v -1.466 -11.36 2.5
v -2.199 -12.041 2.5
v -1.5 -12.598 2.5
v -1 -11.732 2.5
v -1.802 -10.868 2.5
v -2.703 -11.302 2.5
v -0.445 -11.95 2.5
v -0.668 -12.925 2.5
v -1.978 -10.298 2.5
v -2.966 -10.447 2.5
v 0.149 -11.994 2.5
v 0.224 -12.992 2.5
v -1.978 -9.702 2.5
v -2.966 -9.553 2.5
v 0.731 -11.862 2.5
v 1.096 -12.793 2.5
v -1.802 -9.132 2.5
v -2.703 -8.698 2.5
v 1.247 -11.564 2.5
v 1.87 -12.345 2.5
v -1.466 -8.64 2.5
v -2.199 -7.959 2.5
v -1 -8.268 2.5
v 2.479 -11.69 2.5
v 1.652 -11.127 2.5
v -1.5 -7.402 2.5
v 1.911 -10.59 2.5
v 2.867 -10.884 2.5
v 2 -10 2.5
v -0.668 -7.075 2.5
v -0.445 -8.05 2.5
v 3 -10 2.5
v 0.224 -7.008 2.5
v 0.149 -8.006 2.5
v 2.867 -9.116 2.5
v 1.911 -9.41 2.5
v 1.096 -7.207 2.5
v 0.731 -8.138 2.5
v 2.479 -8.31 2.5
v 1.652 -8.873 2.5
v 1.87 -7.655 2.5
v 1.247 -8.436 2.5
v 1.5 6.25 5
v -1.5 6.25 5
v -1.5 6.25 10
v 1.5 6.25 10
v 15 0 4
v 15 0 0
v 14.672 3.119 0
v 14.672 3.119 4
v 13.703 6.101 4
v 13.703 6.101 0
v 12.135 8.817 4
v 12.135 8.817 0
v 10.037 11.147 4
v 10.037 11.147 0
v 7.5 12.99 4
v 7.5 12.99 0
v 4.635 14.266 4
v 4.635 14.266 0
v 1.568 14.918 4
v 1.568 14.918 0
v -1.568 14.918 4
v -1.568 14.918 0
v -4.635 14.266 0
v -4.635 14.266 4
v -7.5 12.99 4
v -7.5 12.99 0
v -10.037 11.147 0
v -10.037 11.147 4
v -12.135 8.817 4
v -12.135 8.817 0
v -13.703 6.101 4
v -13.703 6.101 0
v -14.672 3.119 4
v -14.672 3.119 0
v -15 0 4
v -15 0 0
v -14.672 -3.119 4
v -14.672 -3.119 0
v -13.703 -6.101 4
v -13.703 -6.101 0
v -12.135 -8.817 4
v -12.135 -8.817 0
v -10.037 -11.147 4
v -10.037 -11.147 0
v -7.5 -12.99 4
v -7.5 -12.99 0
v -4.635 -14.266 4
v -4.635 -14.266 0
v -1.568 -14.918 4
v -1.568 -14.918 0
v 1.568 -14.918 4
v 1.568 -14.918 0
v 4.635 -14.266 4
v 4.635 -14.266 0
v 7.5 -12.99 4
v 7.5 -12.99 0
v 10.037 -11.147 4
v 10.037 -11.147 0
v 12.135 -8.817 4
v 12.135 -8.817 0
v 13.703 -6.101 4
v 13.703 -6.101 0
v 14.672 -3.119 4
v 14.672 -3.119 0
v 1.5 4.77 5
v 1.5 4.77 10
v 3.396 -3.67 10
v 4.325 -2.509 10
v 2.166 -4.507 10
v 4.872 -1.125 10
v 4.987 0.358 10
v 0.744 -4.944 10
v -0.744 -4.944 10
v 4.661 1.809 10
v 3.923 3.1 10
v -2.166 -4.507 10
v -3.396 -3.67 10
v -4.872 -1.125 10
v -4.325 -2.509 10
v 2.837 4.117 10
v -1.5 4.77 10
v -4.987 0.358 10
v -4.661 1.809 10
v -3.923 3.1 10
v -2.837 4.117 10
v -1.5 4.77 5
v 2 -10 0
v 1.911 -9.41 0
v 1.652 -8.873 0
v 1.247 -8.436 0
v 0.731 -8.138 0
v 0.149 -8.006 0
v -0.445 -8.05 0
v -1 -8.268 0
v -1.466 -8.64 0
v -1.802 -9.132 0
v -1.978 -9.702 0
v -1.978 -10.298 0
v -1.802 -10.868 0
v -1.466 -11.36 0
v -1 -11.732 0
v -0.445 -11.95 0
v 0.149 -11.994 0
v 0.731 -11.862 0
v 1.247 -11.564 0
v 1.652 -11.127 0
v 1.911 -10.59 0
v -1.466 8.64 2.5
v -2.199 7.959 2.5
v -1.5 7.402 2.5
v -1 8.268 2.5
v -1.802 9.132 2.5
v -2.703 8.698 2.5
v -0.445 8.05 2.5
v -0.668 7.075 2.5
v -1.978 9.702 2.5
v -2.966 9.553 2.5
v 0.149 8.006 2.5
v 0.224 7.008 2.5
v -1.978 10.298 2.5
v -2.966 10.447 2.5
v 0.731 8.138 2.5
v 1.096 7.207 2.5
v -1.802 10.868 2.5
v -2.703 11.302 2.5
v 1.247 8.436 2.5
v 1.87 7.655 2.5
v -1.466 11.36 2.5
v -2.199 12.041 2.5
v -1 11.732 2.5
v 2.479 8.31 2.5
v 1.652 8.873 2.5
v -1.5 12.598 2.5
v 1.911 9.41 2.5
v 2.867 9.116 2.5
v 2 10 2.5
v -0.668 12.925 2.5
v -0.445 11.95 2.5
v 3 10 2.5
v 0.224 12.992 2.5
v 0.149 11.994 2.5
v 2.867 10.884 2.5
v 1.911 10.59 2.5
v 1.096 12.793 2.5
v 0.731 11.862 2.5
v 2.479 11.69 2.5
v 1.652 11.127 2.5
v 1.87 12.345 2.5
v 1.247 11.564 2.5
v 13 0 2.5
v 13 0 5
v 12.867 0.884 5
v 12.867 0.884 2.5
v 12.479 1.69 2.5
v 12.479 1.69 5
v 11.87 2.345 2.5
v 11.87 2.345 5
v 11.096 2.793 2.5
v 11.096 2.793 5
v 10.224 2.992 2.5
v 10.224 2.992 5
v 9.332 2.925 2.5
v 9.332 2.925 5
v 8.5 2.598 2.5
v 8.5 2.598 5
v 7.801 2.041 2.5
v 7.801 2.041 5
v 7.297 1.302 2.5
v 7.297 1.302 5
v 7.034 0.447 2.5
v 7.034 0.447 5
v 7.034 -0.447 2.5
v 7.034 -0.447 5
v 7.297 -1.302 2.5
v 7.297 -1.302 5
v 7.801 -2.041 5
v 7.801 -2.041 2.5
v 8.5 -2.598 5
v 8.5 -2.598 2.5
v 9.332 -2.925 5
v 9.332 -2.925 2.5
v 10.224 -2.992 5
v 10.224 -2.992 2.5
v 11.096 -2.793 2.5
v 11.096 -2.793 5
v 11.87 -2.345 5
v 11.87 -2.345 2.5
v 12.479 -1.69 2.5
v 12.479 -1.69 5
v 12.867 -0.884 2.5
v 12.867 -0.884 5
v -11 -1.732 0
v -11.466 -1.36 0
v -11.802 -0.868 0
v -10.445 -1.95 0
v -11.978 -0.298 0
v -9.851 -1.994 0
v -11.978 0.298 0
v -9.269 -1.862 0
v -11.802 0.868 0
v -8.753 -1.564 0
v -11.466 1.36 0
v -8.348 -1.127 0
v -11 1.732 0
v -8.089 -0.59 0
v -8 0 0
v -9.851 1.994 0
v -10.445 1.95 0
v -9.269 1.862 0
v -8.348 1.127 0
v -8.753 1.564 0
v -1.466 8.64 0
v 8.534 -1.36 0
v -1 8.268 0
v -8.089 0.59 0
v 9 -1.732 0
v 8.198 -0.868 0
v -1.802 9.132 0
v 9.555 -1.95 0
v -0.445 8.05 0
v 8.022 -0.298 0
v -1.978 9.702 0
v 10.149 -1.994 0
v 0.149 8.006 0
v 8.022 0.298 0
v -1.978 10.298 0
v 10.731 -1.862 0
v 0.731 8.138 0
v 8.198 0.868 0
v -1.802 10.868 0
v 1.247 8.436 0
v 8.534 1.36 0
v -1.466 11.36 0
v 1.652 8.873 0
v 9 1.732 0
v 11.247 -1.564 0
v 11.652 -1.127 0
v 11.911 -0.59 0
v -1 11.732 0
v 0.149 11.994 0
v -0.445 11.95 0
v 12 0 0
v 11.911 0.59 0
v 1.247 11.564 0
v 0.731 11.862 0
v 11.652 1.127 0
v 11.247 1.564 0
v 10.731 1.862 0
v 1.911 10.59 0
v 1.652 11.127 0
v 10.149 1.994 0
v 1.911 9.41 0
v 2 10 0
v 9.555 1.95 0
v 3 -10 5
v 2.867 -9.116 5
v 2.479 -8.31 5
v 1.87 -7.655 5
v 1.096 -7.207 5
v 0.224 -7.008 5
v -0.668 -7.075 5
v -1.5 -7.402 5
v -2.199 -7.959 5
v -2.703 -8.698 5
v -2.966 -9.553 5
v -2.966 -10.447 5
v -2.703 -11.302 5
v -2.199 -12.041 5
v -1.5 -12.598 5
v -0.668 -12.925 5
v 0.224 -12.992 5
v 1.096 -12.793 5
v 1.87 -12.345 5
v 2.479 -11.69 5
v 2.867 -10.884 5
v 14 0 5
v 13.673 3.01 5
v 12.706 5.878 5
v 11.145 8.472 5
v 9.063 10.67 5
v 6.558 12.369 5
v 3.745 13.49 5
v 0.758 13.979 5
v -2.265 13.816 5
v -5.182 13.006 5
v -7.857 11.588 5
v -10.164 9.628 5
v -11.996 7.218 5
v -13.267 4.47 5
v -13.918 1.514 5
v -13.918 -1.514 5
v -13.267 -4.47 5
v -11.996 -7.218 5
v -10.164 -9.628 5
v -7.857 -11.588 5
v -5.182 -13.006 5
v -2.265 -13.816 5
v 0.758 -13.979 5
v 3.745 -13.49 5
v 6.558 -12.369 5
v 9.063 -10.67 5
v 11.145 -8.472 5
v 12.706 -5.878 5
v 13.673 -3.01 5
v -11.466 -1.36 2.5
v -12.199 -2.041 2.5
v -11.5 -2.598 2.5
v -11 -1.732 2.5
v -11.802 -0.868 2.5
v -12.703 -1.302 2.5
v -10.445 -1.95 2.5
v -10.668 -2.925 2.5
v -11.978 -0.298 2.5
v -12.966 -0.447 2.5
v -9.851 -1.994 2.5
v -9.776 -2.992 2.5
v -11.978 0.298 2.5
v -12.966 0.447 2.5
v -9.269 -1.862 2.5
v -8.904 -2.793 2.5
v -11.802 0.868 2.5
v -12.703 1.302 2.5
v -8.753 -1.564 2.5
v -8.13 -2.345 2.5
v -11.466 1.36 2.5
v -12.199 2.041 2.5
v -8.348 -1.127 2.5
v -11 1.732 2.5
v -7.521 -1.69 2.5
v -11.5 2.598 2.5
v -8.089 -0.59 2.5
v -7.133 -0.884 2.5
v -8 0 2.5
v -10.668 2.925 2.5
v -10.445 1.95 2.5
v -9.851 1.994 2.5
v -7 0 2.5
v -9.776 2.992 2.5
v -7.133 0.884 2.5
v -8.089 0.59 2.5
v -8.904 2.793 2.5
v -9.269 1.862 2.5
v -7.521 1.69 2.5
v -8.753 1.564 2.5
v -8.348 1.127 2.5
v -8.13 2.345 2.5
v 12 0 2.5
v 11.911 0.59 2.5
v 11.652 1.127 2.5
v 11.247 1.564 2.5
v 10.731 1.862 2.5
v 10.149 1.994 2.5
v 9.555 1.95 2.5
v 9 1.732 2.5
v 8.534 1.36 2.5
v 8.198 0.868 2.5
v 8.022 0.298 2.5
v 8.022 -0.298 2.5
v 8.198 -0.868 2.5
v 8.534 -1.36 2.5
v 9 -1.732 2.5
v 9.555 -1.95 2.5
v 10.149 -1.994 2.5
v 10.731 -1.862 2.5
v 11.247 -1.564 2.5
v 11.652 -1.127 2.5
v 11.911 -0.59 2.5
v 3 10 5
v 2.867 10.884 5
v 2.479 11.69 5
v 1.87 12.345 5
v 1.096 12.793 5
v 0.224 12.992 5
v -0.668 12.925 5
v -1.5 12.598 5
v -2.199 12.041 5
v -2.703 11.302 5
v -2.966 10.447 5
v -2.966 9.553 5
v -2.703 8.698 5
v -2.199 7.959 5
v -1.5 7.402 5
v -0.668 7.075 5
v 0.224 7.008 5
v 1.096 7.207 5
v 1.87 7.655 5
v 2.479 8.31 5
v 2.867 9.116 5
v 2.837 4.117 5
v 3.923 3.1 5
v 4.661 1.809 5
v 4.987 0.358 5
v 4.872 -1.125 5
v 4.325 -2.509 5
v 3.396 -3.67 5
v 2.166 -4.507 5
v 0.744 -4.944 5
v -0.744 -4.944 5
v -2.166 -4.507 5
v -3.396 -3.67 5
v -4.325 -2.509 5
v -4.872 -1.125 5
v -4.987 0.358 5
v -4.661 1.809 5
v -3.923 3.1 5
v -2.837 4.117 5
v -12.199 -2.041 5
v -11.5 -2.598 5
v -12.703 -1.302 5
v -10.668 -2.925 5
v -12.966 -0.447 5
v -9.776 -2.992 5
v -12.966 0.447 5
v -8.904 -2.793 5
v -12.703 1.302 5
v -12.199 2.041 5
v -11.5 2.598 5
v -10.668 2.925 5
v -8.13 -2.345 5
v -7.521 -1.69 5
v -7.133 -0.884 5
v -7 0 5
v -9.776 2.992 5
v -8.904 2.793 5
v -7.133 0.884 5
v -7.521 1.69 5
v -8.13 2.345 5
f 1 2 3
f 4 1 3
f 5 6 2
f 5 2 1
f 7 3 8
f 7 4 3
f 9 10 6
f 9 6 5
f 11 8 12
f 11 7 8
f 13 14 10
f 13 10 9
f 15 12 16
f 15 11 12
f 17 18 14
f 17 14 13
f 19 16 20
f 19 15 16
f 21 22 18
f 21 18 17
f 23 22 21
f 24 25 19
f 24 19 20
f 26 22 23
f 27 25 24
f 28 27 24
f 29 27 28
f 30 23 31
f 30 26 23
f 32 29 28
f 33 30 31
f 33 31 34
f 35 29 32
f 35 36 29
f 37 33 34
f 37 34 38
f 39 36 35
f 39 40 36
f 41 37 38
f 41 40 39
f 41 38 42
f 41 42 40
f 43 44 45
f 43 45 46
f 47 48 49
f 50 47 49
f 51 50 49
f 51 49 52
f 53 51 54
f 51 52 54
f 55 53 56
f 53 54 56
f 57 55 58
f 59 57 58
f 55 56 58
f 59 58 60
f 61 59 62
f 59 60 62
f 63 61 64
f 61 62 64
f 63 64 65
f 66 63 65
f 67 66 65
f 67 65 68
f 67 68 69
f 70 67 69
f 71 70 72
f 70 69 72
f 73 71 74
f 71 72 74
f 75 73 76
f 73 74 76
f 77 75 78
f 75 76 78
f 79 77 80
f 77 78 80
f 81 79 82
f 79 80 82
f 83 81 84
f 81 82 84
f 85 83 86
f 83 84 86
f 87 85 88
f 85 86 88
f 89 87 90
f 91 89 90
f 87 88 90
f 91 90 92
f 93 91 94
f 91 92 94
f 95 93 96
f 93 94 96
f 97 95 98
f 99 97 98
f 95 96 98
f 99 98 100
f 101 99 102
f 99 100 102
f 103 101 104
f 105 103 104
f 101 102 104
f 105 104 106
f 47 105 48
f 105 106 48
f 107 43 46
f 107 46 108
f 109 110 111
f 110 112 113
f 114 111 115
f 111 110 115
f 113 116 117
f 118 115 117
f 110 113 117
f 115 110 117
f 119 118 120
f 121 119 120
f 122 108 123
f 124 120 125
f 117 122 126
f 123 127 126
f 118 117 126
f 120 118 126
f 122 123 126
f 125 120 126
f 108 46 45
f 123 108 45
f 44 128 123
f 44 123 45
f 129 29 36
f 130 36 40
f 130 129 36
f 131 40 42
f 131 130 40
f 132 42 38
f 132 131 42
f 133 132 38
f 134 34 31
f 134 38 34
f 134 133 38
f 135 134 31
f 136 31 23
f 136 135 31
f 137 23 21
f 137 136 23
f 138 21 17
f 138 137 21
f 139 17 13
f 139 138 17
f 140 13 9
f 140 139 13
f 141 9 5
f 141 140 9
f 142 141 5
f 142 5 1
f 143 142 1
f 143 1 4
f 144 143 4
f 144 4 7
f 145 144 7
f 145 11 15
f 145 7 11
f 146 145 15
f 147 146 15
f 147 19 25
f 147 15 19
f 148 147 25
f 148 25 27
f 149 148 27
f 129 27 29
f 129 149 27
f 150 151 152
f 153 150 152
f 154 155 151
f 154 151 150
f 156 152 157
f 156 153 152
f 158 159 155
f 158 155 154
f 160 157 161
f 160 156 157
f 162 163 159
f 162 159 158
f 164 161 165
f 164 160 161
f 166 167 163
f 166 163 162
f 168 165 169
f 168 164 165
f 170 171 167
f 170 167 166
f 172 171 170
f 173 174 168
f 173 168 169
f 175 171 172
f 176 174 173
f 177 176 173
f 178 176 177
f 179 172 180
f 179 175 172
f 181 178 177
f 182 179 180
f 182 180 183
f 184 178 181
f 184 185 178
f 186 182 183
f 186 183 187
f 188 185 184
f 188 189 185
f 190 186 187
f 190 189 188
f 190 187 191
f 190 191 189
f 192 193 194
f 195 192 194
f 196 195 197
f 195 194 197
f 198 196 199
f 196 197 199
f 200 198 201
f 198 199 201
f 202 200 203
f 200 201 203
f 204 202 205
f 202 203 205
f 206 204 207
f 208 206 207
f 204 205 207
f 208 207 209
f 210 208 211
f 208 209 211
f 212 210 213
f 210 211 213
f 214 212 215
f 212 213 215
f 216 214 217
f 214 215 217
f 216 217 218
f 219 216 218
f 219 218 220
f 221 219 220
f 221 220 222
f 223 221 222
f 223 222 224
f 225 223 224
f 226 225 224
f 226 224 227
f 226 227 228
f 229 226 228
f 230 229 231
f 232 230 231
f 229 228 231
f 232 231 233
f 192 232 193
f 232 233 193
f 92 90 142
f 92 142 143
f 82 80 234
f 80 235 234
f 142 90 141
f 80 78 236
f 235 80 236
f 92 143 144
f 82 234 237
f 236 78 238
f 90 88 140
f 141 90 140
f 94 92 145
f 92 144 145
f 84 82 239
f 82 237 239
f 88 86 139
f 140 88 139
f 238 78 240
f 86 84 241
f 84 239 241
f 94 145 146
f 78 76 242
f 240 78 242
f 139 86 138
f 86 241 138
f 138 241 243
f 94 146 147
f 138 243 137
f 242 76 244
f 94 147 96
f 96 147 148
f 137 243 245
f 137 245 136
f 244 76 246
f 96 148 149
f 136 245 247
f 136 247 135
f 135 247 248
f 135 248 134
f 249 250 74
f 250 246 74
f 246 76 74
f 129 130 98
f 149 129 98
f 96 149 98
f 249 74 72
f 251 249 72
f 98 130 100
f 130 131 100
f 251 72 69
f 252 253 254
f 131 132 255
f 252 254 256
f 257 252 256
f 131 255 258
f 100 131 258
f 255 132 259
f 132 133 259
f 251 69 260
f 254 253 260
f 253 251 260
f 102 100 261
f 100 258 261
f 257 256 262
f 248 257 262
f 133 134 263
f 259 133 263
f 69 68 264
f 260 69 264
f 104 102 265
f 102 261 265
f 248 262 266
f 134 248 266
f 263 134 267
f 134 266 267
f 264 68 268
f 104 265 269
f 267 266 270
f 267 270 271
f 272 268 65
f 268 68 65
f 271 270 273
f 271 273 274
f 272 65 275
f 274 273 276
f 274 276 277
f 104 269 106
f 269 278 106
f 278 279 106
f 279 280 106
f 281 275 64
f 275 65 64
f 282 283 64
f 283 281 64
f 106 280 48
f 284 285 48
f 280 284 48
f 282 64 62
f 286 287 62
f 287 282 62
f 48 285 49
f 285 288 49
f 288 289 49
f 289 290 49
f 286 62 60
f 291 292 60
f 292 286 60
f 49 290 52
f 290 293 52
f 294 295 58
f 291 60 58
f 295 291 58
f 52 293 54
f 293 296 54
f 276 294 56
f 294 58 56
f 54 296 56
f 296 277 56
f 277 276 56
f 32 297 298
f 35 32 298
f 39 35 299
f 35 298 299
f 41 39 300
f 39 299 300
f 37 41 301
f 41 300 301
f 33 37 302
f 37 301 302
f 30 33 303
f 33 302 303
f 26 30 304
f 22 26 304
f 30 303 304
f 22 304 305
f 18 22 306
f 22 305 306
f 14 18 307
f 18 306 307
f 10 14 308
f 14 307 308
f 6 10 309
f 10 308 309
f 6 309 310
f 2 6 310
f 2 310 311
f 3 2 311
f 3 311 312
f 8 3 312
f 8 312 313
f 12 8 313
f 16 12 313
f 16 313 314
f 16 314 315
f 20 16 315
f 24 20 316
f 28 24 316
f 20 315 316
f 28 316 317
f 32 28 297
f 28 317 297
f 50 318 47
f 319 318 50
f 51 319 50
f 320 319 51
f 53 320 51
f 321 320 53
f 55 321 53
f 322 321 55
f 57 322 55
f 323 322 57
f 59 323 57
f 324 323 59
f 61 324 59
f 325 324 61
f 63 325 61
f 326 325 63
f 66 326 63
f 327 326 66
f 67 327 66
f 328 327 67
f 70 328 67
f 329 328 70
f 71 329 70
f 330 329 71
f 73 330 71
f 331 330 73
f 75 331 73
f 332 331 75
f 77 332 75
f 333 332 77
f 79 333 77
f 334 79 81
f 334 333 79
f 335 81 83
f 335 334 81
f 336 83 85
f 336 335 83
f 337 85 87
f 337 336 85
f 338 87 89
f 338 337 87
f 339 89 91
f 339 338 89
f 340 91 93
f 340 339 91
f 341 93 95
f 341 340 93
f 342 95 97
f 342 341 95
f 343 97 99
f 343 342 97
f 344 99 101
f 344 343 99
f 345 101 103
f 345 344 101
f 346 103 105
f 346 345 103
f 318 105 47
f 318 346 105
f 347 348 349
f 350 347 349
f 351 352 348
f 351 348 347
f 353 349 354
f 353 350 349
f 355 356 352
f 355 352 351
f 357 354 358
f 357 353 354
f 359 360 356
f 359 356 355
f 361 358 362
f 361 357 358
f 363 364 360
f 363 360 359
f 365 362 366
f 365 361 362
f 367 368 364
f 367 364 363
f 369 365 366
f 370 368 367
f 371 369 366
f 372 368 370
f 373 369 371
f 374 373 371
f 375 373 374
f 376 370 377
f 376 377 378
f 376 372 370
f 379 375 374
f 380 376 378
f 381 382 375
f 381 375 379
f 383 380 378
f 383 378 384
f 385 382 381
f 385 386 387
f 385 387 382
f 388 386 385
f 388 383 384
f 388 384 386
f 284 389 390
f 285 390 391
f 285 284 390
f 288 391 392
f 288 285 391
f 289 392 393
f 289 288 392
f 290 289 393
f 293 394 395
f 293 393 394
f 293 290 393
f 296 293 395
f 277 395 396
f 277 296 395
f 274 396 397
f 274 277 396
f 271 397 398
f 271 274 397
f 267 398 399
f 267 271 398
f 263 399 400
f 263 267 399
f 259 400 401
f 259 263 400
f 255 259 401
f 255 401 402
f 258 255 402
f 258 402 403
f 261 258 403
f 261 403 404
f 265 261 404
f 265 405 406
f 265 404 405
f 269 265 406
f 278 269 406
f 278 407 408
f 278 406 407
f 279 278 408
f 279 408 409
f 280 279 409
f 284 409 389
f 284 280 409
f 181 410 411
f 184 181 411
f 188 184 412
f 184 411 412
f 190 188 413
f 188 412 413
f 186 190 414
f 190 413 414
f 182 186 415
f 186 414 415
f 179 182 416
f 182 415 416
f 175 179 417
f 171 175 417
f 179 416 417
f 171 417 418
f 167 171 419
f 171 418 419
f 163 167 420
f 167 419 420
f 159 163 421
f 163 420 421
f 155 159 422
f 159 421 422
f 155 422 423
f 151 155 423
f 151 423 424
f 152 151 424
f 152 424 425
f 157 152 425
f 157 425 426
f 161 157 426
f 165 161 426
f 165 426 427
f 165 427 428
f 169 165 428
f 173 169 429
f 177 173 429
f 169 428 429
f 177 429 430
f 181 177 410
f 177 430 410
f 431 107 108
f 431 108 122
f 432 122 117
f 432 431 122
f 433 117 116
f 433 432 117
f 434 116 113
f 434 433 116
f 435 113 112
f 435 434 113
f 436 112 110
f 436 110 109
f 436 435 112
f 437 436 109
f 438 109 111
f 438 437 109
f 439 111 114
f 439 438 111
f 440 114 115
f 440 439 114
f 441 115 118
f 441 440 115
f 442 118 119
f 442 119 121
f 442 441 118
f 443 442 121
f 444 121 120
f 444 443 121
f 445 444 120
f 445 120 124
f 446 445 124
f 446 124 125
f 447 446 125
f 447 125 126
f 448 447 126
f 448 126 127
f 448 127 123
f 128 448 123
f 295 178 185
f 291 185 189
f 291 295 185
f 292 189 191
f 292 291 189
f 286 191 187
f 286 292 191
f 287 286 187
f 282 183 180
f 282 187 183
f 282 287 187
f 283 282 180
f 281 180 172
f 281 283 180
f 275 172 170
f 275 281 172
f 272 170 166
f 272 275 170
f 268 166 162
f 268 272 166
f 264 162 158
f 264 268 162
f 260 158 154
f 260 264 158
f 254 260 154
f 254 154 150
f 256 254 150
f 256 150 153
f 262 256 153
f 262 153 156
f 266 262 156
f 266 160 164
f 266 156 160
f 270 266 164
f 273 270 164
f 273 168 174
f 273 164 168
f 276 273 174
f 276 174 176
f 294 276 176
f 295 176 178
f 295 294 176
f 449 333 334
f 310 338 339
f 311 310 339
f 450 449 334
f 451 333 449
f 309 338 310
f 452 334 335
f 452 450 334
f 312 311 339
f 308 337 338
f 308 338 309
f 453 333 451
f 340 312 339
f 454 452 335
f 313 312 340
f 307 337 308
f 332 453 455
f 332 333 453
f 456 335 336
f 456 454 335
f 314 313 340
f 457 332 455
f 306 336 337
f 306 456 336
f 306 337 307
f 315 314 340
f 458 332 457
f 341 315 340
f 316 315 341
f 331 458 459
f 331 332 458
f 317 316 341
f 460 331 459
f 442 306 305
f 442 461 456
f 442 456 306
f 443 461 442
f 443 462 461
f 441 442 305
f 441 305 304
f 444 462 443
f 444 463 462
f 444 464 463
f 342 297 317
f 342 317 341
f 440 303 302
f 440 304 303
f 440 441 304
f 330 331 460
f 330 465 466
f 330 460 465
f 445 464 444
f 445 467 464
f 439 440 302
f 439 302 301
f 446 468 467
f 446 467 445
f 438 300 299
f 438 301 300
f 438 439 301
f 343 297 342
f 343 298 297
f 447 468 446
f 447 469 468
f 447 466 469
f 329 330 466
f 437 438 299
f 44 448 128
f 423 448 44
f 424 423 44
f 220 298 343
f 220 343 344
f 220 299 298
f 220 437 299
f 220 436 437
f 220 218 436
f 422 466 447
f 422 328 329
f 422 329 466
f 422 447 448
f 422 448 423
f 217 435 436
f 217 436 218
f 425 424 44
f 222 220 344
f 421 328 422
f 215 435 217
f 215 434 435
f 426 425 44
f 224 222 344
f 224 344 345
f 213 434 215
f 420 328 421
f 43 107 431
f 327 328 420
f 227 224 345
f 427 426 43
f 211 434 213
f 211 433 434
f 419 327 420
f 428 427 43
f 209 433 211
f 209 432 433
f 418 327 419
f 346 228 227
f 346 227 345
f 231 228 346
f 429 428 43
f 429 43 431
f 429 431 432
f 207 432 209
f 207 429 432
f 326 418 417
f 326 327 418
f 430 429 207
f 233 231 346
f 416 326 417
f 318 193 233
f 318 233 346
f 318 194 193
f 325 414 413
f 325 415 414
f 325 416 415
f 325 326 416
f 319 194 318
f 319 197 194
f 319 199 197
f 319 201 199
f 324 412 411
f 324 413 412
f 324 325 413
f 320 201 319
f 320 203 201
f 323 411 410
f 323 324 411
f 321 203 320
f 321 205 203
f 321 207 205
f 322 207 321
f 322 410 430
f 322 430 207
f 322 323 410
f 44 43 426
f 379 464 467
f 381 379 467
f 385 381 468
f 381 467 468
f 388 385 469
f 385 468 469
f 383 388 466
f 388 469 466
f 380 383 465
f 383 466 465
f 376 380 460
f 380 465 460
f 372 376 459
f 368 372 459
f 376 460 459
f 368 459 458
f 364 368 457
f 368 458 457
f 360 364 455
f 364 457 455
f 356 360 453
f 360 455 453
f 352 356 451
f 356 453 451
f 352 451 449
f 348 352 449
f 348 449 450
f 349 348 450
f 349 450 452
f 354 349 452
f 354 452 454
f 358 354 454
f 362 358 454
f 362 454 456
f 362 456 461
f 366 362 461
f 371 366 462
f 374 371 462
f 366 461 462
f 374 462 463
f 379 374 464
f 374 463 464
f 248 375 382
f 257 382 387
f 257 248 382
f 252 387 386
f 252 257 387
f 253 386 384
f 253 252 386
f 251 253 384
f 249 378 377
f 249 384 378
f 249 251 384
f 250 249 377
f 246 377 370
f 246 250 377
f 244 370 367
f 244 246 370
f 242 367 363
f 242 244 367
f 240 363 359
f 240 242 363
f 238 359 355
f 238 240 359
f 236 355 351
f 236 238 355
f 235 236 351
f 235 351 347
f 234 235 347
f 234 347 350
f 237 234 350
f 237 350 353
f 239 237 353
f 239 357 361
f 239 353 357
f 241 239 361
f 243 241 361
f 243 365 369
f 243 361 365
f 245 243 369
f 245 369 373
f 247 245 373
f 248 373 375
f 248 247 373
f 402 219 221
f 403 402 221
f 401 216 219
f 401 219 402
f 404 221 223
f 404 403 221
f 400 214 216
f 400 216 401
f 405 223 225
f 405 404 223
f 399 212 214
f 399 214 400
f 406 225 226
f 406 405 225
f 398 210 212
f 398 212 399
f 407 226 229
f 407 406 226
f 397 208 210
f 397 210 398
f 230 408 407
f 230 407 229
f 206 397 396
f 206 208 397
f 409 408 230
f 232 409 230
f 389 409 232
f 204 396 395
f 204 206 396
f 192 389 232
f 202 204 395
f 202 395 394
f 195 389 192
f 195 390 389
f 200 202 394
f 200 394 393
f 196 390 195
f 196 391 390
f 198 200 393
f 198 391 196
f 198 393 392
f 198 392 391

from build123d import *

# Parameters (mm, degrees)
SKETCH1_R           = 15
SKETCH1_R_2         = 2
BOSS_EXTRUDE1_DEPTH = 5
BOSS_EXTRUDE2_DEPTH = 5
SKETCH3_R           = 3
CUT_EXTRUDE1_DEPTH  = 2.5
CHAMFER1_SIZE       = 1


with BuildPart() as part:
    # Sketch1 → Boss-Extrude1 (new body)
    with BuildSketch(Plane.XY):
        Circle(SKETCH1_R)
        with Locations((0, 10)):
            Circle(SKETCH1_R_2, mode=Mode.SUBTRACT)
        with Locations((10, 0)):
            Circle(SKETCH1_R_2, mode=Mode.SUBTRACT)
        with Locations((0, -10)):
            Circle(SKETCH1_R_2, mode=Mode.SUBTRACT)
        with Locations((-10, 0)):
            Circle(SKETCH1_R_2, mode=Mode.SUBTRACT)
    extrude(amount=BOSS_EXTRUDE1_DEPTH)

    # Sketch2 → Boss-Extrude2 (add)
    with BuildSketch(Plane.XY.offset(5)):
        with BuildLine():
            Line((-1.5, 6.25), (1.5, 6.25))
            Line((1.5, 6.25), (1.5, 4.769696007))
            ThreePointArc((1.5, 4.769696007), (0, -5), (-1.5, 4.769696007))
            Line((-1.5, 4.769696007), (-1.5, 6.25))
        make_face()
    extrude(amount=BOSS_EXTRUDE2_DEPTH)

    # Sketch3 → Cut-Extrude1 (cut)
    with BuildSketch(Plane.XY.offset(5)):
        with Locations((0, 10)):
            Circle(SKETCH3_R)
        with Locations((-10, 0)):
            Circle(SKETCH3_R)
        with Locations((10, 0)):
            Circle(SKETCH3_R)
        with Locations((0, -10)):
            Circle(SKETCH3_R)
    extrude(amount=-CUT_EXTRUDE1_DEPTH, mode=Mode.SUBTRACT)

    # Chamfer1
    chamfer1_edges = [part.edges().sort_by_distance(p)[0] for p in [
        (-15, 0, 5),
    ]]
    chamfer(chamfer1_edges, length=CHAMFER1_SIZE)


solid = part.part
